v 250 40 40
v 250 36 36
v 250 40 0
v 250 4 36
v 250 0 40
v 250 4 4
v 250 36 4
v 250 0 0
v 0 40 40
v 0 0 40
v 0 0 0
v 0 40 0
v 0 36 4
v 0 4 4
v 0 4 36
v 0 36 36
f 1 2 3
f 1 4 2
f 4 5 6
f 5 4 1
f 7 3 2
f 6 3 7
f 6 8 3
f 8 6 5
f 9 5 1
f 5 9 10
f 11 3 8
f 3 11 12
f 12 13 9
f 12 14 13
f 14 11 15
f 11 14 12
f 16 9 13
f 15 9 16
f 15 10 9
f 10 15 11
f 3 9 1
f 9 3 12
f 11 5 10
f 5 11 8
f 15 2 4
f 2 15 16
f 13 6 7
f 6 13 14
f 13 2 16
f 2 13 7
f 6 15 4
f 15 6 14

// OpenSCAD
$fn = 32;

// ----------------------------------------------------------------------
// Box beam: 200-250 mm hollow beam
// ----------------------------------------------------------------------

// --- parameters (mm) ---
beam_l = 250;             // beam length, X
beam_w = 40;              // beam width, Y
beam_h = 40;              // beam height, Z
wall = 4;                 // wall thickness

difference() {
  cube([beam_l, beam_w, beam_h]);
  translate([-1, wall, wall])
    cube([beam_l + 2, beam_w - 2 * wall, beam_h - 2 * wall]);
}
